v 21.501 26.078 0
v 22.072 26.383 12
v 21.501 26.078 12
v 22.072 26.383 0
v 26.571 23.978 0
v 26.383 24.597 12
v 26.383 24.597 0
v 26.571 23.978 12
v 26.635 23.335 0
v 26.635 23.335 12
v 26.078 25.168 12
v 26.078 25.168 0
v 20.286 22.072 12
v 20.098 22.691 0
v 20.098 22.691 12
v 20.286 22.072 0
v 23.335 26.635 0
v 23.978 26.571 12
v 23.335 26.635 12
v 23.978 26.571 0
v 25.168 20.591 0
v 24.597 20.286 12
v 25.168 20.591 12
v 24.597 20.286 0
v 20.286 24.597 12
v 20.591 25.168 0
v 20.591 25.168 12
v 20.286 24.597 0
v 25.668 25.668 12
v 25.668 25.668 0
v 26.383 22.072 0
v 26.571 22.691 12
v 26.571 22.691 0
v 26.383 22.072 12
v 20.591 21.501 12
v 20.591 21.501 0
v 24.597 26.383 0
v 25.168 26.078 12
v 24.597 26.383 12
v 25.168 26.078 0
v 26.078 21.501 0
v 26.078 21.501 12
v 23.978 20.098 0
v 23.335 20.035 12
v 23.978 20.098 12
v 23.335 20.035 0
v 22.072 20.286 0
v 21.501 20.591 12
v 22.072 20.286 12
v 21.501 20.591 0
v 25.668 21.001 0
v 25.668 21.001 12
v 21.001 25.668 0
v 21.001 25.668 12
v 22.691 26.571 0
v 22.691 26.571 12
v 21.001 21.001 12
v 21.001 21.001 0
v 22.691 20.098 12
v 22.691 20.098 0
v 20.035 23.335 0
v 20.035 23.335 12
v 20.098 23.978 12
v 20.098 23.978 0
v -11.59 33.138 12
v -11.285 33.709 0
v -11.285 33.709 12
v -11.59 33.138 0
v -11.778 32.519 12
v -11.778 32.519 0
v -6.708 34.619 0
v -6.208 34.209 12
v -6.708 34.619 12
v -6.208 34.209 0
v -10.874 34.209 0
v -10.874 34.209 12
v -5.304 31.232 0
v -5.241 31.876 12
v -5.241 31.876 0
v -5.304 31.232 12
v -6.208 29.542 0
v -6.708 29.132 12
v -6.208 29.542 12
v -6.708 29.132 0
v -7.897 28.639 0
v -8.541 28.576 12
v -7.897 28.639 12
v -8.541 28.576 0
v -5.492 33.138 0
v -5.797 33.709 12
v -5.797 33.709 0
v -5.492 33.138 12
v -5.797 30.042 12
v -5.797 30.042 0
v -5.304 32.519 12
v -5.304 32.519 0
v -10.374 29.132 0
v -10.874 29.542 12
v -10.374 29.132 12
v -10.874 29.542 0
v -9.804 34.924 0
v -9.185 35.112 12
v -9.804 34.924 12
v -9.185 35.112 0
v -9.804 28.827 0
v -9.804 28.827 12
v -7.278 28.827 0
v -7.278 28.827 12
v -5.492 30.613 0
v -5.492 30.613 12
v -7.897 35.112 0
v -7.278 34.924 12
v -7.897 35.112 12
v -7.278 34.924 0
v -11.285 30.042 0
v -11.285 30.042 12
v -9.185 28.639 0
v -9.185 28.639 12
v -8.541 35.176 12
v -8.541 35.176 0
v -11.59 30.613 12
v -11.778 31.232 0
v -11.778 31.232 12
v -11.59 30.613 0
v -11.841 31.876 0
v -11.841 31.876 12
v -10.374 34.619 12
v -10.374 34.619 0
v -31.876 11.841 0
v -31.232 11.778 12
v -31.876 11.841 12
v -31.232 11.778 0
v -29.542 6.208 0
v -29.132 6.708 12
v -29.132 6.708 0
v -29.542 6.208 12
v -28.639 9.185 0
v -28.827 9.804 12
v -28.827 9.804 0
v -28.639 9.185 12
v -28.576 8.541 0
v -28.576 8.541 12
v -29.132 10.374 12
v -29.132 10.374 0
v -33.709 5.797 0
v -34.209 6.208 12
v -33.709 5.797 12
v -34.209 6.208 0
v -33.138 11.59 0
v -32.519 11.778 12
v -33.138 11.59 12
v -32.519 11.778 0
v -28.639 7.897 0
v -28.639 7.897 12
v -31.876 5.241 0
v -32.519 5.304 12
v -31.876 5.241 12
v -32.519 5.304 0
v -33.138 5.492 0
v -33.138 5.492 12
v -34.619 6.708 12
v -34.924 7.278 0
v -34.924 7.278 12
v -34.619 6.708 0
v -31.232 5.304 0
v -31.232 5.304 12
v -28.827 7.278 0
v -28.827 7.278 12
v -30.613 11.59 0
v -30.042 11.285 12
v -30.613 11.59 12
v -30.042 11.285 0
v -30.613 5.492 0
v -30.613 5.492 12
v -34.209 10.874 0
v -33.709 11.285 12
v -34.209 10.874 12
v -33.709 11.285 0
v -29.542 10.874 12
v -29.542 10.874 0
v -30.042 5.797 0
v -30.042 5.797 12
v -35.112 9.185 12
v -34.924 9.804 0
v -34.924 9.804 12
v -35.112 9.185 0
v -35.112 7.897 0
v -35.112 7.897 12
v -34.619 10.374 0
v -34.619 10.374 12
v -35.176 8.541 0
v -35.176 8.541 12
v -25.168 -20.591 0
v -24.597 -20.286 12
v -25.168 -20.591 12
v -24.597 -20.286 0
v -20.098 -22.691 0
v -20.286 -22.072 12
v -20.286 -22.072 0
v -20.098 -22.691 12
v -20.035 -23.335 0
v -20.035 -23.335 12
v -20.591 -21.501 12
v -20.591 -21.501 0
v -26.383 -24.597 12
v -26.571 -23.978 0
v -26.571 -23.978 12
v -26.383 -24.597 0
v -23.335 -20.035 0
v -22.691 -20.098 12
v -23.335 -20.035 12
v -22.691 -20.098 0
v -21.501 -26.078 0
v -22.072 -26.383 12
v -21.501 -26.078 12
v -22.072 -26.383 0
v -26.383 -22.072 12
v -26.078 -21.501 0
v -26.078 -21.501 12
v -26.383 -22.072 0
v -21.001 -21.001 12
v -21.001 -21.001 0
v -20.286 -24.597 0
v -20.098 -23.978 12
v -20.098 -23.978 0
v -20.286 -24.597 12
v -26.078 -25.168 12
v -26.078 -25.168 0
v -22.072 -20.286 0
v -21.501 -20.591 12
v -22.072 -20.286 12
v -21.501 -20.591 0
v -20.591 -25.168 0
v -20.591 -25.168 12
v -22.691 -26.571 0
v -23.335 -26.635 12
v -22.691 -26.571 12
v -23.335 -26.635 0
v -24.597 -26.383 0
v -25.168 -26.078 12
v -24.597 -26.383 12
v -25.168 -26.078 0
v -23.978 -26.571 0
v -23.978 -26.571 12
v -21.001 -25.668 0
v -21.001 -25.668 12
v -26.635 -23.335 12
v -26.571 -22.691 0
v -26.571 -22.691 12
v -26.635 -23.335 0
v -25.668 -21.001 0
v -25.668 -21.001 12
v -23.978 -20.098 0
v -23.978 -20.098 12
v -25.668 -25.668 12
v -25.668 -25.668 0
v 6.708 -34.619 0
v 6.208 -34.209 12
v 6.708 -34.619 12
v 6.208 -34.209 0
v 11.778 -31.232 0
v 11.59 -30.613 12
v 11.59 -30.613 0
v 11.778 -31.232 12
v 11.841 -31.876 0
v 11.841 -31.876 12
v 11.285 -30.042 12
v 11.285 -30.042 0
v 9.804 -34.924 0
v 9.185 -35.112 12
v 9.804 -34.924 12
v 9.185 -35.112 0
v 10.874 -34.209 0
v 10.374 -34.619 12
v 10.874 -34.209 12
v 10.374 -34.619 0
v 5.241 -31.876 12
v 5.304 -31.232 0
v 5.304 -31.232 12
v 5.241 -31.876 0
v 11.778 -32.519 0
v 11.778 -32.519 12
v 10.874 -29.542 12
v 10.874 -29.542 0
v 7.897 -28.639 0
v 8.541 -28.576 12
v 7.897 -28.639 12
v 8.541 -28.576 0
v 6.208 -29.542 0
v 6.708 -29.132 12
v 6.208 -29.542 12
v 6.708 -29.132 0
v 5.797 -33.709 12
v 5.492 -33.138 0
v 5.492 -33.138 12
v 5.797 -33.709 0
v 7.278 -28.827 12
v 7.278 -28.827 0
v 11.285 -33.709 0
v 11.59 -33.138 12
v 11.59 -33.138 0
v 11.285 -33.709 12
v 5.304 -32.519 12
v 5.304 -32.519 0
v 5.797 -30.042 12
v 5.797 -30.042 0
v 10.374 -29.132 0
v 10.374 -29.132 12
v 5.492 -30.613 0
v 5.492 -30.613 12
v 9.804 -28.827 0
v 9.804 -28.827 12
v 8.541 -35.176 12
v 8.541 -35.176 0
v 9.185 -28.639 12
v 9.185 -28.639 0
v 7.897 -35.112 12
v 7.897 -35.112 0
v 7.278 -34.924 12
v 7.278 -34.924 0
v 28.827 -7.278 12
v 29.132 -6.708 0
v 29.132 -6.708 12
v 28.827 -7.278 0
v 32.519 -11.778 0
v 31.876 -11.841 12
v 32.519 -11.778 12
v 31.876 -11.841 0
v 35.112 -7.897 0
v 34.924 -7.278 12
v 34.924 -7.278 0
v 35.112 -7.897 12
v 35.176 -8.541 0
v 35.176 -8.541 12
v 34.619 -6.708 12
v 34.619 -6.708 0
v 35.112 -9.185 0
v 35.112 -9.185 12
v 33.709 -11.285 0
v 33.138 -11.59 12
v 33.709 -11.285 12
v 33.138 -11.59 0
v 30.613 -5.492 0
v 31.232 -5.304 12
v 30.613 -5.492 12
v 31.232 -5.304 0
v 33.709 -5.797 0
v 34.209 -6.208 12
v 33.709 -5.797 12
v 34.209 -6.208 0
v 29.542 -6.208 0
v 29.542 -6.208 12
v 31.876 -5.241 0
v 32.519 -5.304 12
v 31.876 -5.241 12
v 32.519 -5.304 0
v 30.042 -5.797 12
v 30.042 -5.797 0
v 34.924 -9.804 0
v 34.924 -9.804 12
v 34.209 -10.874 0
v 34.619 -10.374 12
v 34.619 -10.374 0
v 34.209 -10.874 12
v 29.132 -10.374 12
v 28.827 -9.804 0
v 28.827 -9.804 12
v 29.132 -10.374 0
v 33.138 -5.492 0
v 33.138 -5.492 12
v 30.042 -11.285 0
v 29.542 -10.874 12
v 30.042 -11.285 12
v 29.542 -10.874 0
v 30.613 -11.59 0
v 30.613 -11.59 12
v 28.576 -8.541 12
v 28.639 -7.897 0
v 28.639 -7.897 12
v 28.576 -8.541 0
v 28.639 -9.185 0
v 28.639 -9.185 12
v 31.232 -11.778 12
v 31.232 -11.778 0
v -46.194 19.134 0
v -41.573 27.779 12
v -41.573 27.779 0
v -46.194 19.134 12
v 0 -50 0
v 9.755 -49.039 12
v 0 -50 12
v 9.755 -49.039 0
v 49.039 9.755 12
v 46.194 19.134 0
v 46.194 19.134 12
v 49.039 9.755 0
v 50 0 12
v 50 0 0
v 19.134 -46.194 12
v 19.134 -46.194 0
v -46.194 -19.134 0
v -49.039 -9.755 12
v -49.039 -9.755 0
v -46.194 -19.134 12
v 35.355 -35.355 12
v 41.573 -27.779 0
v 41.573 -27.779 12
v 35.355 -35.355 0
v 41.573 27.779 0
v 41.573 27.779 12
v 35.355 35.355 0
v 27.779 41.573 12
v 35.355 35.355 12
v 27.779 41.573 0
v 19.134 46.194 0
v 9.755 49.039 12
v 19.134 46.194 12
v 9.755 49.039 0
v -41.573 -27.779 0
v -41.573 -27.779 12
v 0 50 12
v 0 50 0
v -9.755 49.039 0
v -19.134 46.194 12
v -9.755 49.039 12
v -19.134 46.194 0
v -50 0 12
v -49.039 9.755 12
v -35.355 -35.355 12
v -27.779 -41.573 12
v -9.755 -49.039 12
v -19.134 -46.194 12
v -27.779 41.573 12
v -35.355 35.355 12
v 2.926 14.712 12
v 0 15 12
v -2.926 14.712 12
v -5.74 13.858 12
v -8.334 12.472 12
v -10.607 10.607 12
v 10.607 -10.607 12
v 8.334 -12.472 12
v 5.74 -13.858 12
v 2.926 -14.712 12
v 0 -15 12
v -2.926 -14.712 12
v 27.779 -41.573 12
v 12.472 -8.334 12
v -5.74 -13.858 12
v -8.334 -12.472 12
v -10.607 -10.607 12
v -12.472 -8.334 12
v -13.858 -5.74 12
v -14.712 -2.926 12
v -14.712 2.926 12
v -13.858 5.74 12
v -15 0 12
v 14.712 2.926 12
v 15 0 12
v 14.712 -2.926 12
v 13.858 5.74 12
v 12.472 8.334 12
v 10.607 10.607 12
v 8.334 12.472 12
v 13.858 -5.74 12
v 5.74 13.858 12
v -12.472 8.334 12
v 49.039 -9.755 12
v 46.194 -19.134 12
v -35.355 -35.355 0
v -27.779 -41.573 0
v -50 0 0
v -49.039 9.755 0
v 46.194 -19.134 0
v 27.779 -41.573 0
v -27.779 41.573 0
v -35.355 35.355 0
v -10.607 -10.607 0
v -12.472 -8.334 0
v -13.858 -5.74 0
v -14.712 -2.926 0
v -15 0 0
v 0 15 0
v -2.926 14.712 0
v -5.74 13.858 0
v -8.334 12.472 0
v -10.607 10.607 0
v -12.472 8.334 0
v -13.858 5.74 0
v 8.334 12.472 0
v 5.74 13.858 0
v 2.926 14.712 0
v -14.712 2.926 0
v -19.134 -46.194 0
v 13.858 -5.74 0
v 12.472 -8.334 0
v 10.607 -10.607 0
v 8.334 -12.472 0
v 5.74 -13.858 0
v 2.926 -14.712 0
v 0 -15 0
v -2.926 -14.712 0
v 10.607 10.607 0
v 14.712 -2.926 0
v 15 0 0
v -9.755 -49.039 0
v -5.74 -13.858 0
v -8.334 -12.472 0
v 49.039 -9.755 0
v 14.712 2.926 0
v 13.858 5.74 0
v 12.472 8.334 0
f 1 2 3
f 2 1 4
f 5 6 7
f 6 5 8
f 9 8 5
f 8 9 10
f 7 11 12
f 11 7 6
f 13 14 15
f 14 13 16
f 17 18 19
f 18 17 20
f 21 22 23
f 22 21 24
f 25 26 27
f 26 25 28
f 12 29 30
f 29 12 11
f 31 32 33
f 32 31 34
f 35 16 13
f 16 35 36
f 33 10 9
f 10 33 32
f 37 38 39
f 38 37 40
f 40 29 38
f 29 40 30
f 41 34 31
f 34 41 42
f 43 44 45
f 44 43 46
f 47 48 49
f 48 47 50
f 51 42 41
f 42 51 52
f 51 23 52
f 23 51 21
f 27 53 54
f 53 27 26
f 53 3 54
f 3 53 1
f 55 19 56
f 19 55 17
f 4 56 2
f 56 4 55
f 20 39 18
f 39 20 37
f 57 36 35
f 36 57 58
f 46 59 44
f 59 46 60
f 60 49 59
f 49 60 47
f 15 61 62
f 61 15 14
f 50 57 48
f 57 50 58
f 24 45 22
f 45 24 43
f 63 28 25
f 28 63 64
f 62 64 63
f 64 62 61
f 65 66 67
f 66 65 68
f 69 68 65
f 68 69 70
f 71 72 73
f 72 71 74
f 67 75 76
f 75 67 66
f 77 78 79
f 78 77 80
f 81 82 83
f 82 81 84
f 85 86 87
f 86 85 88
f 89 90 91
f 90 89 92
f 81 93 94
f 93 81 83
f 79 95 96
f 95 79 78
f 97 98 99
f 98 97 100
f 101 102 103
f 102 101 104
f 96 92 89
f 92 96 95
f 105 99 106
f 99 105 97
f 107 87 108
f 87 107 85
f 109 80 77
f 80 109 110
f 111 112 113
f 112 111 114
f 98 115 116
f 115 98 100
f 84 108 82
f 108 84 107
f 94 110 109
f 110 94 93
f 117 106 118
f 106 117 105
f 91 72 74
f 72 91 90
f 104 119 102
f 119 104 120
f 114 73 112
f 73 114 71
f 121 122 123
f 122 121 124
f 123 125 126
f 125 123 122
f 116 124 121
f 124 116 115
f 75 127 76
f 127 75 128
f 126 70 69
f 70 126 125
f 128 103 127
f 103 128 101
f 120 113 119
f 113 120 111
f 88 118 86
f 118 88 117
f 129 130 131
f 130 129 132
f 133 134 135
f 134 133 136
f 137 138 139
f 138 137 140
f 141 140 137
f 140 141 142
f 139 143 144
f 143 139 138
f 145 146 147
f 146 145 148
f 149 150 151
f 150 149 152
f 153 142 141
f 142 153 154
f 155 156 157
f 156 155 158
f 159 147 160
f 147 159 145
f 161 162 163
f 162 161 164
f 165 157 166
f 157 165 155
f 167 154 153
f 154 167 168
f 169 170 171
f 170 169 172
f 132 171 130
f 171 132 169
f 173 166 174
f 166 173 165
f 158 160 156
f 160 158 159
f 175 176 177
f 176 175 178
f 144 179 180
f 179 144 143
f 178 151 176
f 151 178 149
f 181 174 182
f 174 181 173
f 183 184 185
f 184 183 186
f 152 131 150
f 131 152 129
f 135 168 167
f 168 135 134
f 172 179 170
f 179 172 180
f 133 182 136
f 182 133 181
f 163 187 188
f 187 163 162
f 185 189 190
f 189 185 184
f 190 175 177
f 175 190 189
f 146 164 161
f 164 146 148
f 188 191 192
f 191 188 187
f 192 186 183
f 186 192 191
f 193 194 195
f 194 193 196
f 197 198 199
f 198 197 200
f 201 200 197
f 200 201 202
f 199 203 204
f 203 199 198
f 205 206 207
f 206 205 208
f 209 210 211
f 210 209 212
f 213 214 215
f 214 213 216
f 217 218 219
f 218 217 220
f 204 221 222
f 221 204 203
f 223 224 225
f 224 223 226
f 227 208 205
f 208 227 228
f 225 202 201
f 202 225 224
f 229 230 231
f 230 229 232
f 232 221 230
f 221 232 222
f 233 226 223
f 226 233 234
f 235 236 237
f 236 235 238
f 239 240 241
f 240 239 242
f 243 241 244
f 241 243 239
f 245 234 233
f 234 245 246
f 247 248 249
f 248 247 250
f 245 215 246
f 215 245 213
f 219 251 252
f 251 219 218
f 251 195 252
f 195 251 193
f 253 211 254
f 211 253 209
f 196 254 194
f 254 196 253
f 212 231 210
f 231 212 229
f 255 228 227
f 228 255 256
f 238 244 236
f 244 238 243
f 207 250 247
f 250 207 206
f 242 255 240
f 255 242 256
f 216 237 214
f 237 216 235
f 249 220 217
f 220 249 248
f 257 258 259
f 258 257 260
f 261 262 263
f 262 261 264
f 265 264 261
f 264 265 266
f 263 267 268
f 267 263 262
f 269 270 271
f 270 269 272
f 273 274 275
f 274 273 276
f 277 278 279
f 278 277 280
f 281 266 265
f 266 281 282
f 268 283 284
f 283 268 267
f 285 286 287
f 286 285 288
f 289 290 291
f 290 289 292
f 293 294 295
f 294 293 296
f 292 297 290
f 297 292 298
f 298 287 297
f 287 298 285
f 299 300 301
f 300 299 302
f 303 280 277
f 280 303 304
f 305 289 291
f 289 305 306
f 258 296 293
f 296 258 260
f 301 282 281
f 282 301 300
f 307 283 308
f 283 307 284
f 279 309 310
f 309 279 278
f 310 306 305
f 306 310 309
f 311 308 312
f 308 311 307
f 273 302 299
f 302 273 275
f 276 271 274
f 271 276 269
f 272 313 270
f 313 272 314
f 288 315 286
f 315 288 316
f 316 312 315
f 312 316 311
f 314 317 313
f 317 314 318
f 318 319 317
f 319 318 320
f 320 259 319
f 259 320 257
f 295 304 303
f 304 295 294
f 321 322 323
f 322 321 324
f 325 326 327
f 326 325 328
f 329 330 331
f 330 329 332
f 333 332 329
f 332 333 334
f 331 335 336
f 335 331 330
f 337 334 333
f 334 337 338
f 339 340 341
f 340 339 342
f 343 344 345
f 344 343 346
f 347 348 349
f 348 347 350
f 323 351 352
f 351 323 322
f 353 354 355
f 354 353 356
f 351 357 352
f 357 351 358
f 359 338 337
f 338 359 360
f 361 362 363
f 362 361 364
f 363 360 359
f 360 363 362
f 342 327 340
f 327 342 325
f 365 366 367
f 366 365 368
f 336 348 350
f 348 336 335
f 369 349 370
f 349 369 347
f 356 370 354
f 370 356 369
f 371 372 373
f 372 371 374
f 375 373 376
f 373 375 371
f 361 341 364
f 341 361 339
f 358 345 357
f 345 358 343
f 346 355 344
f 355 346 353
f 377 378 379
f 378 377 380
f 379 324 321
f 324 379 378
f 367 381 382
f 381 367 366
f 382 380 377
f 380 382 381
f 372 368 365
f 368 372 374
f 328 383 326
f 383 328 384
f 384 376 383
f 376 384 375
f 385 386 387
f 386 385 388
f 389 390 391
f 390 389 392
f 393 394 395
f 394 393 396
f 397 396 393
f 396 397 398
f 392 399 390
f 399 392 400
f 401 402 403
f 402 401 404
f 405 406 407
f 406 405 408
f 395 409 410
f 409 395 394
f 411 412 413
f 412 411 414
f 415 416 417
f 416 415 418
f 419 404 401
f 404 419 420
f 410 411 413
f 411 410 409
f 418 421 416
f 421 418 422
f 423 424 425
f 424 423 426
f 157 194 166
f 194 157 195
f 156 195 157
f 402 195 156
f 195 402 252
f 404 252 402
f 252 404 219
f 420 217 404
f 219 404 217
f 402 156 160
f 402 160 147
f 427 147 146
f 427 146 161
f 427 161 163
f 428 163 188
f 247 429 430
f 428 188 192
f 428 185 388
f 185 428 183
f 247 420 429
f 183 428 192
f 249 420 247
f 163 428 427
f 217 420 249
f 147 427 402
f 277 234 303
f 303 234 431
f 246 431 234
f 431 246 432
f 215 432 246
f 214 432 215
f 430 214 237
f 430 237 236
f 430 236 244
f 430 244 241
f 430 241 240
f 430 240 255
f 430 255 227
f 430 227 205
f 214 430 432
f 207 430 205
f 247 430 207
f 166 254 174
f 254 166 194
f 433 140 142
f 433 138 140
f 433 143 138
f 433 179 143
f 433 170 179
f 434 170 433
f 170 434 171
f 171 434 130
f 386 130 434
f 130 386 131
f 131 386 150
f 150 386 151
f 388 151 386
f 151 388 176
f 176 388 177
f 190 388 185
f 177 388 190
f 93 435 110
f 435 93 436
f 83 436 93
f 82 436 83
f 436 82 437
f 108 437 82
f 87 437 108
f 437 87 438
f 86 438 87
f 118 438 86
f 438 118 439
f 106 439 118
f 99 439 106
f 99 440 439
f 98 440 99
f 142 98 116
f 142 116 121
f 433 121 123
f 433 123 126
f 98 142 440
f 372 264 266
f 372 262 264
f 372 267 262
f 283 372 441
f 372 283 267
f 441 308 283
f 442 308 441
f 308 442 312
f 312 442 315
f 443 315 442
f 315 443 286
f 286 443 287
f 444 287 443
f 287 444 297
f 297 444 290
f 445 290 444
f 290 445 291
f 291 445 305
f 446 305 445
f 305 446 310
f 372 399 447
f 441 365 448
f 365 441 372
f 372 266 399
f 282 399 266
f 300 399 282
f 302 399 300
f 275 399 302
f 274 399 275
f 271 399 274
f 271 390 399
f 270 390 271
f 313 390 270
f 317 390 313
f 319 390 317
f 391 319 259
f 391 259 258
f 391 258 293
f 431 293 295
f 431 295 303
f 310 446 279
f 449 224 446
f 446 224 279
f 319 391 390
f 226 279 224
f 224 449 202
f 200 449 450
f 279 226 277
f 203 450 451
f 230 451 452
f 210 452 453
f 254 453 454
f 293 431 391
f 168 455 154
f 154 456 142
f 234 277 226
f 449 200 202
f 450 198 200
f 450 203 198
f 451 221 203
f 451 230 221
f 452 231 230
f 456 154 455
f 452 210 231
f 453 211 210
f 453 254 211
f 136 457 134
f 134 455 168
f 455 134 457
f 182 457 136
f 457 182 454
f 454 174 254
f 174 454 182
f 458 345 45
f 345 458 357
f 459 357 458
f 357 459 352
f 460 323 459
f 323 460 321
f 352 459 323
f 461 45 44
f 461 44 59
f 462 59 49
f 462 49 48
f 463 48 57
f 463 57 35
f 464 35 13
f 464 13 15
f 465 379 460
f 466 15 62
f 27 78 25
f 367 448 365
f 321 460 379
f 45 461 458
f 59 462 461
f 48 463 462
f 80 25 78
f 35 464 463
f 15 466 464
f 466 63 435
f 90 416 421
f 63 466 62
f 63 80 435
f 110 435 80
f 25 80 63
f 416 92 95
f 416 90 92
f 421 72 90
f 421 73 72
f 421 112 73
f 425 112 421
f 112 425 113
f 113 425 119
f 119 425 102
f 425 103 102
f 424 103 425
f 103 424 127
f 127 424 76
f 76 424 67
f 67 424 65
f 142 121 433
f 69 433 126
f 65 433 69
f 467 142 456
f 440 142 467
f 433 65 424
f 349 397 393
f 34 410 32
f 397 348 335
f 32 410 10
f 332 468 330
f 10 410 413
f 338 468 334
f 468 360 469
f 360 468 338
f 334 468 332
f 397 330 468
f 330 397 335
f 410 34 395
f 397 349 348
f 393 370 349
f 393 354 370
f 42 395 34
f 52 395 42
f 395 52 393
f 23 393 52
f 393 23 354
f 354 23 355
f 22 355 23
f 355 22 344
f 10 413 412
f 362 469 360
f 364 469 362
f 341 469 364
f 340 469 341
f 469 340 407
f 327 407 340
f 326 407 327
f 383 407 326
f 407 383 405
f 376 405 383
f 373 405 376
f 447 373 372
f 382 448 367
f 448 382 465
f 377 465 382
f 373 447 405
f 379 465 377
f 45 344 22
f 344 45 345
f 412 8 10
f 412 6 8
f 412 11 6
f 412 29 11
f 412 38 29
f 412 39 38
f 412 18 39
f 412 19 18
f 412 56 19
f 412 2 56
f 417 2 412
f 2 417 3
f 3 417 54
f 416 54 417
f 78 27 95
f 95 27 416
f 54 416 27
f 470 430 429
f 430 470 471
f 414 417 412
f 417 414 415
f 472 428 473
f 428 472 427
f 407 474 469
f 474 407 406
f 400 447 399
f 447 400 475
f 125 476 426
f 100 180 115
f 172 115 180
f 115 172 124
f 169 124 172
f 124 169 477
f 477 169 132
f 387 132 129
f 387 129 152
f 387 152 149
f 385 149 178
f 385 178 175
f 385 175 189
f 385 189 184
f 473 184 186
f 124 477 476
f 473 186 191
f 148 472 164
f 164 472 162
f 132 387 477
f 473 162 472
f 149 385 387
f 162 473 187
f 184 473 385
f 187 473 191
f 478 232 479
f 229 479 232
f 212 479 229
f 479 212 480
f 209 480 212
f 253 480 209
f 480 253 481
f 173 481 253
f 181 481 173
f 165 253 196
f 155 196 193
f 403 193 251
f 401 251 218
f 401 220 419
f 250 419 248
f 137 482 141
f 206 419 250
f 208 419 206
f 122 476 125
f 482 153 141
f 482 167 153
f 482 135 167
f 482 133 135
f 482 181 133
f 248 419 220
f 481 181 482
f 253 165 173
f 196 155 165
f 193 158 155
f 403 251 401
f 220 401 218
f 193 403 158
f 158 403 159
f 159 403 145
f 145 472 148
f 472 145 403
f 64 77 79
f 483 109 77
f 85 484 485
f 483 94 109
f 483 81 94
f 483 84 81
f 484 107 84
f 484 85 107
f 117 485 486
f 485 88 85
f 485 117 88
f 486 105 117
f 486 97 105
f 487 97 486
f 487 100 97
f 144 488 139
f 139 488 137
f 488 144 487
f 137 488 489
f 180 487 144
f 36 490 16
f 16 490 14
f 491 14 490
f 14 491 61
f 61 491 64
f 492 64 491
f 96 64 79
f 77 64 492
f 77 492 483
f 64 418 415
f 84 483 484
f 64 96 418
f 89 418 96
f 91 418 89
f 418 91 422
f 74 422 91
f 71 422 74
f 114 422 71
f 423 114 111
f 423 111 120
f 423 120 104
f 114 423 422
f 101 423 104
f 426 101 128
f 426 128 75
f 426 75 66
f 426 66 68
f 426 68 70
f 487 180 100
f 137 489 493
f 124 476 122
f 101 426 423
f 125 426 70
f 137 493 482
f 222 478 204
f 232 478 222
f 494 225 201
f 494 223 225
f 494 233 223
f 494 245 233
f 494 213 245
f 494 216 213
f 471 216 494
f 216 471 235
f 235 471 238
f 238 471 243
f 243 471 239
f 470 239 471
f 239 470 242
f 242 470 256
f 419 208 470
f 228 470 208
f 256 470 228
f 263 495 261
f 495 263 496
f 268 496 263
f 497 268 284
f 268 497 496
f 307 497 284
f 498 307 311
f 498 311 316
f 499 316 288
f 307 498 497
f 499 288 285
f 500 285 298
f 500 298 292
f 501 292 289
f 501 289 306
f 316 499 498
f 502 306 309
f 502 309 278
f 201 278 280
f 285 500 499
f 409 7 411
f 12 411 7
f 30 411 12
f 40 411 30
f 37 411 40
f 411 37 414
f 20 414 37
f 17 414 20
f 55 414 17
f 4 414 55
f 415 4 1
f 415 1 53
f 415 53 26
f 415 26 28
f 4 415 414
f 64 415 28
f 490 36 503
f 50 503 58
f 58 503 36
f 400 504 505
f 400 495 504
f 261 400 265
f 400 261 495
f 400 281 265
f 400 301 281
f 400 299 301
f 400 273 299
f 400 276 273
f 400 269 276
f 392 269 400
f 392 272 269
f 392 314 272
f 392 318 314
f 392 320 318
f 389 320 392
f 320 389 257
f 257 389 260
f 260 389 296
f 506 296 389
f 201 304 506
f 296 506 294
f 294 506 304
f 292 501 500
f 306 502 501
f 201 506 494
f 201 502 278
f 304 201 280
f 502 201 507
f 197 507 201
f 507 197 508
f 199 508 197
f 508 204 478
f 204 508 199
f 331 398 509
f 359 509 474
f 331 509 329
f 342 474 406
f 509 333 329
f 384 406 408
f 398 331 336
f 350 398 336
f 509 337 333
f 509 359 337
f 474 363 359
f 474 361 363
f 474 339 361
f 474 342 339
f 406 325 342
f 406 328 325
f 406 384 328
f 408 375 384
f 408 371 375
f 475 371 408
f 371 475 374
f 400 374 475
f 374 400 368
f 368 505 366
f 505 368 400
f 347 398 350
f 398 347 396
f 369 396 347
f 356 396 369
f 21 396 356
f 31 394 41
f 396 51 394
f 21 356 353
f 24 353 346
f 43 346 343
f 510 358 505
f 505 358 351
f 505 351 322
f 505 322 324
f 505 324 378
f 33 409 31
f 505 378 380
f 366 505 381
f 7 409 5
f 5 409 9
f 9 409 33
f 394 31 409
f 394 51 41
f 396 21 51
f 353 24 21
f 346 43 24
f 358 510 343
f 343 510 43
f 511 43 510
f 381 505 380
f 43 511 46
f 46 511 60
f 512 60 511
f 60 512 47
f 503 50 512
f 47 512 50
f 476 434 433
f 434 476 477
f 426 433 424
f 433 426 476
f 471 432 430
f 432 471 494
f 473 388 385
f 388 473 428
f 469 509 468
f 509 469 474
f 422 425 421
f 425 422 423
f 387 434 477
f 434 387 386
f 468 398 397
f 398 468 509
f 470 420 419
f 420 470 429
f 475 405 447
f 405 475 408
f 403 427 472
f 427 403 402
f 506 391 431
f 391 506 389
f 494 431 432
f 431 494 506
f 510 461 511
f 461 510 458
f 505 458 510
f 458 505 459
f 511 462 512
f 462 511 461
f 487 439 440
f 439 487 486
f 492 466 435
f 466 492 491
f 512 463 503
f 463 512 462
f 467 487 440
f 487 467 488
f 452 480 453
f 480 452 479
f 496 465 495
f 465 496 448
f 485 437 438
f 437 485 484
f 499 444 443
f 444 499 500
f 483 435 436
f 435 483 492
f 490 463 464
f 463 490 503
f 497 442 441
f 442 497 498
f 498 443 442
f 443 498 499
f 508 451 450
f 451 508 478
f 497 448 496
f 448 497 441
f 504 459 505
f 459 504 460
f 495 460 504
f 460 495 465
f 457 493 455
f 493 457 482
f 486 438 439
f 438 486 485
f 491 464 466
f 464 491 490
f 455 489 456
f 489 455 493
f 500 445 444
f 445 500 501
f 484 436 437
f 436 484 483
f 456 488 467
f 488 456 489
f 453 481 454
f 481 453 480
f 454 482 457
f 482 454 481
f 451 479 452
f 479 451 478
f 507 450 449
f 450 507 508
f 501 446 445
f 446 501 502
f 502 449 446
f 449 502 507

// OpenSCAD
$fn = 32;

// ----------------------------------------------------------------------
// Flange Ø100 x 12
// 6 holes on a Ø66 bolt circle, bolted joints
// ----------------------------------------------------------------------

// --- parameters (mm) ---
flange_d = 100;  // outside diameter of the flange
thickness = 12;  // flange thickness
holes = 6;       // number of bolt holes
pcd = 66;        // bolt circle diameter
start_deg = 45;  // angle of the first hole, from +X
hole_d = 6.6;    // bolt hole diameter
bore_d = 30;     // central through bore
hub_d = 40;      // hub outside diameter
hub_h = 0;       // hub height above the flange face (0 = no hub)

// --- derived feature positions (mm) ---
height = thickness + hub_h;  // = 12   overall height of the part
pcd_r = pcd / 2;             // = 33   bolt circle radius
hole_step = 360 / holes;     // = 60   angular pitch
feature_centers = [
  [pcd_r * cos(start_deg + 0 * hole_step), pcd_r * sin(start_deg + 0 * hole_step)],
  [pcd_r * cos(start_deg + 1 * hole_step), pcd_r * sin(start_deg + 1 * hole_step)],
  [pcd_r * cos(start_deg + 2 * hole_step), pcd_r * sin(start_deg + 2 * hole_step)],
  [pcd_r * cos(start_deg + 3 * hole_step), pcd_r * sin(start_deg + 3 * hole_step)],
  [pcd_r * cos(start_deg + 4 * hole_step), pcd_r * sin(start_deg + 4 * hole_step)],
  [pcd_r * cos(start_deg + 5 * hole_step), pcd_r * sin(start_deg + 5 * hole_step)]
];   // bolt hole centres on the pitch circle

// flange disc, every hole and the bore cut straight through
difference() {
  union() {
    cylinder(d = flange_d, h = thickness);
  }
  translate([0, 0, -1]) cylinder(d = bore_d, h = height + 2);  // bore, through
  for (centre = feature_centers)
    translate([centre[0], centre[1], -1]) cylinder(d = hole_d, h = thickness + 2);
}
